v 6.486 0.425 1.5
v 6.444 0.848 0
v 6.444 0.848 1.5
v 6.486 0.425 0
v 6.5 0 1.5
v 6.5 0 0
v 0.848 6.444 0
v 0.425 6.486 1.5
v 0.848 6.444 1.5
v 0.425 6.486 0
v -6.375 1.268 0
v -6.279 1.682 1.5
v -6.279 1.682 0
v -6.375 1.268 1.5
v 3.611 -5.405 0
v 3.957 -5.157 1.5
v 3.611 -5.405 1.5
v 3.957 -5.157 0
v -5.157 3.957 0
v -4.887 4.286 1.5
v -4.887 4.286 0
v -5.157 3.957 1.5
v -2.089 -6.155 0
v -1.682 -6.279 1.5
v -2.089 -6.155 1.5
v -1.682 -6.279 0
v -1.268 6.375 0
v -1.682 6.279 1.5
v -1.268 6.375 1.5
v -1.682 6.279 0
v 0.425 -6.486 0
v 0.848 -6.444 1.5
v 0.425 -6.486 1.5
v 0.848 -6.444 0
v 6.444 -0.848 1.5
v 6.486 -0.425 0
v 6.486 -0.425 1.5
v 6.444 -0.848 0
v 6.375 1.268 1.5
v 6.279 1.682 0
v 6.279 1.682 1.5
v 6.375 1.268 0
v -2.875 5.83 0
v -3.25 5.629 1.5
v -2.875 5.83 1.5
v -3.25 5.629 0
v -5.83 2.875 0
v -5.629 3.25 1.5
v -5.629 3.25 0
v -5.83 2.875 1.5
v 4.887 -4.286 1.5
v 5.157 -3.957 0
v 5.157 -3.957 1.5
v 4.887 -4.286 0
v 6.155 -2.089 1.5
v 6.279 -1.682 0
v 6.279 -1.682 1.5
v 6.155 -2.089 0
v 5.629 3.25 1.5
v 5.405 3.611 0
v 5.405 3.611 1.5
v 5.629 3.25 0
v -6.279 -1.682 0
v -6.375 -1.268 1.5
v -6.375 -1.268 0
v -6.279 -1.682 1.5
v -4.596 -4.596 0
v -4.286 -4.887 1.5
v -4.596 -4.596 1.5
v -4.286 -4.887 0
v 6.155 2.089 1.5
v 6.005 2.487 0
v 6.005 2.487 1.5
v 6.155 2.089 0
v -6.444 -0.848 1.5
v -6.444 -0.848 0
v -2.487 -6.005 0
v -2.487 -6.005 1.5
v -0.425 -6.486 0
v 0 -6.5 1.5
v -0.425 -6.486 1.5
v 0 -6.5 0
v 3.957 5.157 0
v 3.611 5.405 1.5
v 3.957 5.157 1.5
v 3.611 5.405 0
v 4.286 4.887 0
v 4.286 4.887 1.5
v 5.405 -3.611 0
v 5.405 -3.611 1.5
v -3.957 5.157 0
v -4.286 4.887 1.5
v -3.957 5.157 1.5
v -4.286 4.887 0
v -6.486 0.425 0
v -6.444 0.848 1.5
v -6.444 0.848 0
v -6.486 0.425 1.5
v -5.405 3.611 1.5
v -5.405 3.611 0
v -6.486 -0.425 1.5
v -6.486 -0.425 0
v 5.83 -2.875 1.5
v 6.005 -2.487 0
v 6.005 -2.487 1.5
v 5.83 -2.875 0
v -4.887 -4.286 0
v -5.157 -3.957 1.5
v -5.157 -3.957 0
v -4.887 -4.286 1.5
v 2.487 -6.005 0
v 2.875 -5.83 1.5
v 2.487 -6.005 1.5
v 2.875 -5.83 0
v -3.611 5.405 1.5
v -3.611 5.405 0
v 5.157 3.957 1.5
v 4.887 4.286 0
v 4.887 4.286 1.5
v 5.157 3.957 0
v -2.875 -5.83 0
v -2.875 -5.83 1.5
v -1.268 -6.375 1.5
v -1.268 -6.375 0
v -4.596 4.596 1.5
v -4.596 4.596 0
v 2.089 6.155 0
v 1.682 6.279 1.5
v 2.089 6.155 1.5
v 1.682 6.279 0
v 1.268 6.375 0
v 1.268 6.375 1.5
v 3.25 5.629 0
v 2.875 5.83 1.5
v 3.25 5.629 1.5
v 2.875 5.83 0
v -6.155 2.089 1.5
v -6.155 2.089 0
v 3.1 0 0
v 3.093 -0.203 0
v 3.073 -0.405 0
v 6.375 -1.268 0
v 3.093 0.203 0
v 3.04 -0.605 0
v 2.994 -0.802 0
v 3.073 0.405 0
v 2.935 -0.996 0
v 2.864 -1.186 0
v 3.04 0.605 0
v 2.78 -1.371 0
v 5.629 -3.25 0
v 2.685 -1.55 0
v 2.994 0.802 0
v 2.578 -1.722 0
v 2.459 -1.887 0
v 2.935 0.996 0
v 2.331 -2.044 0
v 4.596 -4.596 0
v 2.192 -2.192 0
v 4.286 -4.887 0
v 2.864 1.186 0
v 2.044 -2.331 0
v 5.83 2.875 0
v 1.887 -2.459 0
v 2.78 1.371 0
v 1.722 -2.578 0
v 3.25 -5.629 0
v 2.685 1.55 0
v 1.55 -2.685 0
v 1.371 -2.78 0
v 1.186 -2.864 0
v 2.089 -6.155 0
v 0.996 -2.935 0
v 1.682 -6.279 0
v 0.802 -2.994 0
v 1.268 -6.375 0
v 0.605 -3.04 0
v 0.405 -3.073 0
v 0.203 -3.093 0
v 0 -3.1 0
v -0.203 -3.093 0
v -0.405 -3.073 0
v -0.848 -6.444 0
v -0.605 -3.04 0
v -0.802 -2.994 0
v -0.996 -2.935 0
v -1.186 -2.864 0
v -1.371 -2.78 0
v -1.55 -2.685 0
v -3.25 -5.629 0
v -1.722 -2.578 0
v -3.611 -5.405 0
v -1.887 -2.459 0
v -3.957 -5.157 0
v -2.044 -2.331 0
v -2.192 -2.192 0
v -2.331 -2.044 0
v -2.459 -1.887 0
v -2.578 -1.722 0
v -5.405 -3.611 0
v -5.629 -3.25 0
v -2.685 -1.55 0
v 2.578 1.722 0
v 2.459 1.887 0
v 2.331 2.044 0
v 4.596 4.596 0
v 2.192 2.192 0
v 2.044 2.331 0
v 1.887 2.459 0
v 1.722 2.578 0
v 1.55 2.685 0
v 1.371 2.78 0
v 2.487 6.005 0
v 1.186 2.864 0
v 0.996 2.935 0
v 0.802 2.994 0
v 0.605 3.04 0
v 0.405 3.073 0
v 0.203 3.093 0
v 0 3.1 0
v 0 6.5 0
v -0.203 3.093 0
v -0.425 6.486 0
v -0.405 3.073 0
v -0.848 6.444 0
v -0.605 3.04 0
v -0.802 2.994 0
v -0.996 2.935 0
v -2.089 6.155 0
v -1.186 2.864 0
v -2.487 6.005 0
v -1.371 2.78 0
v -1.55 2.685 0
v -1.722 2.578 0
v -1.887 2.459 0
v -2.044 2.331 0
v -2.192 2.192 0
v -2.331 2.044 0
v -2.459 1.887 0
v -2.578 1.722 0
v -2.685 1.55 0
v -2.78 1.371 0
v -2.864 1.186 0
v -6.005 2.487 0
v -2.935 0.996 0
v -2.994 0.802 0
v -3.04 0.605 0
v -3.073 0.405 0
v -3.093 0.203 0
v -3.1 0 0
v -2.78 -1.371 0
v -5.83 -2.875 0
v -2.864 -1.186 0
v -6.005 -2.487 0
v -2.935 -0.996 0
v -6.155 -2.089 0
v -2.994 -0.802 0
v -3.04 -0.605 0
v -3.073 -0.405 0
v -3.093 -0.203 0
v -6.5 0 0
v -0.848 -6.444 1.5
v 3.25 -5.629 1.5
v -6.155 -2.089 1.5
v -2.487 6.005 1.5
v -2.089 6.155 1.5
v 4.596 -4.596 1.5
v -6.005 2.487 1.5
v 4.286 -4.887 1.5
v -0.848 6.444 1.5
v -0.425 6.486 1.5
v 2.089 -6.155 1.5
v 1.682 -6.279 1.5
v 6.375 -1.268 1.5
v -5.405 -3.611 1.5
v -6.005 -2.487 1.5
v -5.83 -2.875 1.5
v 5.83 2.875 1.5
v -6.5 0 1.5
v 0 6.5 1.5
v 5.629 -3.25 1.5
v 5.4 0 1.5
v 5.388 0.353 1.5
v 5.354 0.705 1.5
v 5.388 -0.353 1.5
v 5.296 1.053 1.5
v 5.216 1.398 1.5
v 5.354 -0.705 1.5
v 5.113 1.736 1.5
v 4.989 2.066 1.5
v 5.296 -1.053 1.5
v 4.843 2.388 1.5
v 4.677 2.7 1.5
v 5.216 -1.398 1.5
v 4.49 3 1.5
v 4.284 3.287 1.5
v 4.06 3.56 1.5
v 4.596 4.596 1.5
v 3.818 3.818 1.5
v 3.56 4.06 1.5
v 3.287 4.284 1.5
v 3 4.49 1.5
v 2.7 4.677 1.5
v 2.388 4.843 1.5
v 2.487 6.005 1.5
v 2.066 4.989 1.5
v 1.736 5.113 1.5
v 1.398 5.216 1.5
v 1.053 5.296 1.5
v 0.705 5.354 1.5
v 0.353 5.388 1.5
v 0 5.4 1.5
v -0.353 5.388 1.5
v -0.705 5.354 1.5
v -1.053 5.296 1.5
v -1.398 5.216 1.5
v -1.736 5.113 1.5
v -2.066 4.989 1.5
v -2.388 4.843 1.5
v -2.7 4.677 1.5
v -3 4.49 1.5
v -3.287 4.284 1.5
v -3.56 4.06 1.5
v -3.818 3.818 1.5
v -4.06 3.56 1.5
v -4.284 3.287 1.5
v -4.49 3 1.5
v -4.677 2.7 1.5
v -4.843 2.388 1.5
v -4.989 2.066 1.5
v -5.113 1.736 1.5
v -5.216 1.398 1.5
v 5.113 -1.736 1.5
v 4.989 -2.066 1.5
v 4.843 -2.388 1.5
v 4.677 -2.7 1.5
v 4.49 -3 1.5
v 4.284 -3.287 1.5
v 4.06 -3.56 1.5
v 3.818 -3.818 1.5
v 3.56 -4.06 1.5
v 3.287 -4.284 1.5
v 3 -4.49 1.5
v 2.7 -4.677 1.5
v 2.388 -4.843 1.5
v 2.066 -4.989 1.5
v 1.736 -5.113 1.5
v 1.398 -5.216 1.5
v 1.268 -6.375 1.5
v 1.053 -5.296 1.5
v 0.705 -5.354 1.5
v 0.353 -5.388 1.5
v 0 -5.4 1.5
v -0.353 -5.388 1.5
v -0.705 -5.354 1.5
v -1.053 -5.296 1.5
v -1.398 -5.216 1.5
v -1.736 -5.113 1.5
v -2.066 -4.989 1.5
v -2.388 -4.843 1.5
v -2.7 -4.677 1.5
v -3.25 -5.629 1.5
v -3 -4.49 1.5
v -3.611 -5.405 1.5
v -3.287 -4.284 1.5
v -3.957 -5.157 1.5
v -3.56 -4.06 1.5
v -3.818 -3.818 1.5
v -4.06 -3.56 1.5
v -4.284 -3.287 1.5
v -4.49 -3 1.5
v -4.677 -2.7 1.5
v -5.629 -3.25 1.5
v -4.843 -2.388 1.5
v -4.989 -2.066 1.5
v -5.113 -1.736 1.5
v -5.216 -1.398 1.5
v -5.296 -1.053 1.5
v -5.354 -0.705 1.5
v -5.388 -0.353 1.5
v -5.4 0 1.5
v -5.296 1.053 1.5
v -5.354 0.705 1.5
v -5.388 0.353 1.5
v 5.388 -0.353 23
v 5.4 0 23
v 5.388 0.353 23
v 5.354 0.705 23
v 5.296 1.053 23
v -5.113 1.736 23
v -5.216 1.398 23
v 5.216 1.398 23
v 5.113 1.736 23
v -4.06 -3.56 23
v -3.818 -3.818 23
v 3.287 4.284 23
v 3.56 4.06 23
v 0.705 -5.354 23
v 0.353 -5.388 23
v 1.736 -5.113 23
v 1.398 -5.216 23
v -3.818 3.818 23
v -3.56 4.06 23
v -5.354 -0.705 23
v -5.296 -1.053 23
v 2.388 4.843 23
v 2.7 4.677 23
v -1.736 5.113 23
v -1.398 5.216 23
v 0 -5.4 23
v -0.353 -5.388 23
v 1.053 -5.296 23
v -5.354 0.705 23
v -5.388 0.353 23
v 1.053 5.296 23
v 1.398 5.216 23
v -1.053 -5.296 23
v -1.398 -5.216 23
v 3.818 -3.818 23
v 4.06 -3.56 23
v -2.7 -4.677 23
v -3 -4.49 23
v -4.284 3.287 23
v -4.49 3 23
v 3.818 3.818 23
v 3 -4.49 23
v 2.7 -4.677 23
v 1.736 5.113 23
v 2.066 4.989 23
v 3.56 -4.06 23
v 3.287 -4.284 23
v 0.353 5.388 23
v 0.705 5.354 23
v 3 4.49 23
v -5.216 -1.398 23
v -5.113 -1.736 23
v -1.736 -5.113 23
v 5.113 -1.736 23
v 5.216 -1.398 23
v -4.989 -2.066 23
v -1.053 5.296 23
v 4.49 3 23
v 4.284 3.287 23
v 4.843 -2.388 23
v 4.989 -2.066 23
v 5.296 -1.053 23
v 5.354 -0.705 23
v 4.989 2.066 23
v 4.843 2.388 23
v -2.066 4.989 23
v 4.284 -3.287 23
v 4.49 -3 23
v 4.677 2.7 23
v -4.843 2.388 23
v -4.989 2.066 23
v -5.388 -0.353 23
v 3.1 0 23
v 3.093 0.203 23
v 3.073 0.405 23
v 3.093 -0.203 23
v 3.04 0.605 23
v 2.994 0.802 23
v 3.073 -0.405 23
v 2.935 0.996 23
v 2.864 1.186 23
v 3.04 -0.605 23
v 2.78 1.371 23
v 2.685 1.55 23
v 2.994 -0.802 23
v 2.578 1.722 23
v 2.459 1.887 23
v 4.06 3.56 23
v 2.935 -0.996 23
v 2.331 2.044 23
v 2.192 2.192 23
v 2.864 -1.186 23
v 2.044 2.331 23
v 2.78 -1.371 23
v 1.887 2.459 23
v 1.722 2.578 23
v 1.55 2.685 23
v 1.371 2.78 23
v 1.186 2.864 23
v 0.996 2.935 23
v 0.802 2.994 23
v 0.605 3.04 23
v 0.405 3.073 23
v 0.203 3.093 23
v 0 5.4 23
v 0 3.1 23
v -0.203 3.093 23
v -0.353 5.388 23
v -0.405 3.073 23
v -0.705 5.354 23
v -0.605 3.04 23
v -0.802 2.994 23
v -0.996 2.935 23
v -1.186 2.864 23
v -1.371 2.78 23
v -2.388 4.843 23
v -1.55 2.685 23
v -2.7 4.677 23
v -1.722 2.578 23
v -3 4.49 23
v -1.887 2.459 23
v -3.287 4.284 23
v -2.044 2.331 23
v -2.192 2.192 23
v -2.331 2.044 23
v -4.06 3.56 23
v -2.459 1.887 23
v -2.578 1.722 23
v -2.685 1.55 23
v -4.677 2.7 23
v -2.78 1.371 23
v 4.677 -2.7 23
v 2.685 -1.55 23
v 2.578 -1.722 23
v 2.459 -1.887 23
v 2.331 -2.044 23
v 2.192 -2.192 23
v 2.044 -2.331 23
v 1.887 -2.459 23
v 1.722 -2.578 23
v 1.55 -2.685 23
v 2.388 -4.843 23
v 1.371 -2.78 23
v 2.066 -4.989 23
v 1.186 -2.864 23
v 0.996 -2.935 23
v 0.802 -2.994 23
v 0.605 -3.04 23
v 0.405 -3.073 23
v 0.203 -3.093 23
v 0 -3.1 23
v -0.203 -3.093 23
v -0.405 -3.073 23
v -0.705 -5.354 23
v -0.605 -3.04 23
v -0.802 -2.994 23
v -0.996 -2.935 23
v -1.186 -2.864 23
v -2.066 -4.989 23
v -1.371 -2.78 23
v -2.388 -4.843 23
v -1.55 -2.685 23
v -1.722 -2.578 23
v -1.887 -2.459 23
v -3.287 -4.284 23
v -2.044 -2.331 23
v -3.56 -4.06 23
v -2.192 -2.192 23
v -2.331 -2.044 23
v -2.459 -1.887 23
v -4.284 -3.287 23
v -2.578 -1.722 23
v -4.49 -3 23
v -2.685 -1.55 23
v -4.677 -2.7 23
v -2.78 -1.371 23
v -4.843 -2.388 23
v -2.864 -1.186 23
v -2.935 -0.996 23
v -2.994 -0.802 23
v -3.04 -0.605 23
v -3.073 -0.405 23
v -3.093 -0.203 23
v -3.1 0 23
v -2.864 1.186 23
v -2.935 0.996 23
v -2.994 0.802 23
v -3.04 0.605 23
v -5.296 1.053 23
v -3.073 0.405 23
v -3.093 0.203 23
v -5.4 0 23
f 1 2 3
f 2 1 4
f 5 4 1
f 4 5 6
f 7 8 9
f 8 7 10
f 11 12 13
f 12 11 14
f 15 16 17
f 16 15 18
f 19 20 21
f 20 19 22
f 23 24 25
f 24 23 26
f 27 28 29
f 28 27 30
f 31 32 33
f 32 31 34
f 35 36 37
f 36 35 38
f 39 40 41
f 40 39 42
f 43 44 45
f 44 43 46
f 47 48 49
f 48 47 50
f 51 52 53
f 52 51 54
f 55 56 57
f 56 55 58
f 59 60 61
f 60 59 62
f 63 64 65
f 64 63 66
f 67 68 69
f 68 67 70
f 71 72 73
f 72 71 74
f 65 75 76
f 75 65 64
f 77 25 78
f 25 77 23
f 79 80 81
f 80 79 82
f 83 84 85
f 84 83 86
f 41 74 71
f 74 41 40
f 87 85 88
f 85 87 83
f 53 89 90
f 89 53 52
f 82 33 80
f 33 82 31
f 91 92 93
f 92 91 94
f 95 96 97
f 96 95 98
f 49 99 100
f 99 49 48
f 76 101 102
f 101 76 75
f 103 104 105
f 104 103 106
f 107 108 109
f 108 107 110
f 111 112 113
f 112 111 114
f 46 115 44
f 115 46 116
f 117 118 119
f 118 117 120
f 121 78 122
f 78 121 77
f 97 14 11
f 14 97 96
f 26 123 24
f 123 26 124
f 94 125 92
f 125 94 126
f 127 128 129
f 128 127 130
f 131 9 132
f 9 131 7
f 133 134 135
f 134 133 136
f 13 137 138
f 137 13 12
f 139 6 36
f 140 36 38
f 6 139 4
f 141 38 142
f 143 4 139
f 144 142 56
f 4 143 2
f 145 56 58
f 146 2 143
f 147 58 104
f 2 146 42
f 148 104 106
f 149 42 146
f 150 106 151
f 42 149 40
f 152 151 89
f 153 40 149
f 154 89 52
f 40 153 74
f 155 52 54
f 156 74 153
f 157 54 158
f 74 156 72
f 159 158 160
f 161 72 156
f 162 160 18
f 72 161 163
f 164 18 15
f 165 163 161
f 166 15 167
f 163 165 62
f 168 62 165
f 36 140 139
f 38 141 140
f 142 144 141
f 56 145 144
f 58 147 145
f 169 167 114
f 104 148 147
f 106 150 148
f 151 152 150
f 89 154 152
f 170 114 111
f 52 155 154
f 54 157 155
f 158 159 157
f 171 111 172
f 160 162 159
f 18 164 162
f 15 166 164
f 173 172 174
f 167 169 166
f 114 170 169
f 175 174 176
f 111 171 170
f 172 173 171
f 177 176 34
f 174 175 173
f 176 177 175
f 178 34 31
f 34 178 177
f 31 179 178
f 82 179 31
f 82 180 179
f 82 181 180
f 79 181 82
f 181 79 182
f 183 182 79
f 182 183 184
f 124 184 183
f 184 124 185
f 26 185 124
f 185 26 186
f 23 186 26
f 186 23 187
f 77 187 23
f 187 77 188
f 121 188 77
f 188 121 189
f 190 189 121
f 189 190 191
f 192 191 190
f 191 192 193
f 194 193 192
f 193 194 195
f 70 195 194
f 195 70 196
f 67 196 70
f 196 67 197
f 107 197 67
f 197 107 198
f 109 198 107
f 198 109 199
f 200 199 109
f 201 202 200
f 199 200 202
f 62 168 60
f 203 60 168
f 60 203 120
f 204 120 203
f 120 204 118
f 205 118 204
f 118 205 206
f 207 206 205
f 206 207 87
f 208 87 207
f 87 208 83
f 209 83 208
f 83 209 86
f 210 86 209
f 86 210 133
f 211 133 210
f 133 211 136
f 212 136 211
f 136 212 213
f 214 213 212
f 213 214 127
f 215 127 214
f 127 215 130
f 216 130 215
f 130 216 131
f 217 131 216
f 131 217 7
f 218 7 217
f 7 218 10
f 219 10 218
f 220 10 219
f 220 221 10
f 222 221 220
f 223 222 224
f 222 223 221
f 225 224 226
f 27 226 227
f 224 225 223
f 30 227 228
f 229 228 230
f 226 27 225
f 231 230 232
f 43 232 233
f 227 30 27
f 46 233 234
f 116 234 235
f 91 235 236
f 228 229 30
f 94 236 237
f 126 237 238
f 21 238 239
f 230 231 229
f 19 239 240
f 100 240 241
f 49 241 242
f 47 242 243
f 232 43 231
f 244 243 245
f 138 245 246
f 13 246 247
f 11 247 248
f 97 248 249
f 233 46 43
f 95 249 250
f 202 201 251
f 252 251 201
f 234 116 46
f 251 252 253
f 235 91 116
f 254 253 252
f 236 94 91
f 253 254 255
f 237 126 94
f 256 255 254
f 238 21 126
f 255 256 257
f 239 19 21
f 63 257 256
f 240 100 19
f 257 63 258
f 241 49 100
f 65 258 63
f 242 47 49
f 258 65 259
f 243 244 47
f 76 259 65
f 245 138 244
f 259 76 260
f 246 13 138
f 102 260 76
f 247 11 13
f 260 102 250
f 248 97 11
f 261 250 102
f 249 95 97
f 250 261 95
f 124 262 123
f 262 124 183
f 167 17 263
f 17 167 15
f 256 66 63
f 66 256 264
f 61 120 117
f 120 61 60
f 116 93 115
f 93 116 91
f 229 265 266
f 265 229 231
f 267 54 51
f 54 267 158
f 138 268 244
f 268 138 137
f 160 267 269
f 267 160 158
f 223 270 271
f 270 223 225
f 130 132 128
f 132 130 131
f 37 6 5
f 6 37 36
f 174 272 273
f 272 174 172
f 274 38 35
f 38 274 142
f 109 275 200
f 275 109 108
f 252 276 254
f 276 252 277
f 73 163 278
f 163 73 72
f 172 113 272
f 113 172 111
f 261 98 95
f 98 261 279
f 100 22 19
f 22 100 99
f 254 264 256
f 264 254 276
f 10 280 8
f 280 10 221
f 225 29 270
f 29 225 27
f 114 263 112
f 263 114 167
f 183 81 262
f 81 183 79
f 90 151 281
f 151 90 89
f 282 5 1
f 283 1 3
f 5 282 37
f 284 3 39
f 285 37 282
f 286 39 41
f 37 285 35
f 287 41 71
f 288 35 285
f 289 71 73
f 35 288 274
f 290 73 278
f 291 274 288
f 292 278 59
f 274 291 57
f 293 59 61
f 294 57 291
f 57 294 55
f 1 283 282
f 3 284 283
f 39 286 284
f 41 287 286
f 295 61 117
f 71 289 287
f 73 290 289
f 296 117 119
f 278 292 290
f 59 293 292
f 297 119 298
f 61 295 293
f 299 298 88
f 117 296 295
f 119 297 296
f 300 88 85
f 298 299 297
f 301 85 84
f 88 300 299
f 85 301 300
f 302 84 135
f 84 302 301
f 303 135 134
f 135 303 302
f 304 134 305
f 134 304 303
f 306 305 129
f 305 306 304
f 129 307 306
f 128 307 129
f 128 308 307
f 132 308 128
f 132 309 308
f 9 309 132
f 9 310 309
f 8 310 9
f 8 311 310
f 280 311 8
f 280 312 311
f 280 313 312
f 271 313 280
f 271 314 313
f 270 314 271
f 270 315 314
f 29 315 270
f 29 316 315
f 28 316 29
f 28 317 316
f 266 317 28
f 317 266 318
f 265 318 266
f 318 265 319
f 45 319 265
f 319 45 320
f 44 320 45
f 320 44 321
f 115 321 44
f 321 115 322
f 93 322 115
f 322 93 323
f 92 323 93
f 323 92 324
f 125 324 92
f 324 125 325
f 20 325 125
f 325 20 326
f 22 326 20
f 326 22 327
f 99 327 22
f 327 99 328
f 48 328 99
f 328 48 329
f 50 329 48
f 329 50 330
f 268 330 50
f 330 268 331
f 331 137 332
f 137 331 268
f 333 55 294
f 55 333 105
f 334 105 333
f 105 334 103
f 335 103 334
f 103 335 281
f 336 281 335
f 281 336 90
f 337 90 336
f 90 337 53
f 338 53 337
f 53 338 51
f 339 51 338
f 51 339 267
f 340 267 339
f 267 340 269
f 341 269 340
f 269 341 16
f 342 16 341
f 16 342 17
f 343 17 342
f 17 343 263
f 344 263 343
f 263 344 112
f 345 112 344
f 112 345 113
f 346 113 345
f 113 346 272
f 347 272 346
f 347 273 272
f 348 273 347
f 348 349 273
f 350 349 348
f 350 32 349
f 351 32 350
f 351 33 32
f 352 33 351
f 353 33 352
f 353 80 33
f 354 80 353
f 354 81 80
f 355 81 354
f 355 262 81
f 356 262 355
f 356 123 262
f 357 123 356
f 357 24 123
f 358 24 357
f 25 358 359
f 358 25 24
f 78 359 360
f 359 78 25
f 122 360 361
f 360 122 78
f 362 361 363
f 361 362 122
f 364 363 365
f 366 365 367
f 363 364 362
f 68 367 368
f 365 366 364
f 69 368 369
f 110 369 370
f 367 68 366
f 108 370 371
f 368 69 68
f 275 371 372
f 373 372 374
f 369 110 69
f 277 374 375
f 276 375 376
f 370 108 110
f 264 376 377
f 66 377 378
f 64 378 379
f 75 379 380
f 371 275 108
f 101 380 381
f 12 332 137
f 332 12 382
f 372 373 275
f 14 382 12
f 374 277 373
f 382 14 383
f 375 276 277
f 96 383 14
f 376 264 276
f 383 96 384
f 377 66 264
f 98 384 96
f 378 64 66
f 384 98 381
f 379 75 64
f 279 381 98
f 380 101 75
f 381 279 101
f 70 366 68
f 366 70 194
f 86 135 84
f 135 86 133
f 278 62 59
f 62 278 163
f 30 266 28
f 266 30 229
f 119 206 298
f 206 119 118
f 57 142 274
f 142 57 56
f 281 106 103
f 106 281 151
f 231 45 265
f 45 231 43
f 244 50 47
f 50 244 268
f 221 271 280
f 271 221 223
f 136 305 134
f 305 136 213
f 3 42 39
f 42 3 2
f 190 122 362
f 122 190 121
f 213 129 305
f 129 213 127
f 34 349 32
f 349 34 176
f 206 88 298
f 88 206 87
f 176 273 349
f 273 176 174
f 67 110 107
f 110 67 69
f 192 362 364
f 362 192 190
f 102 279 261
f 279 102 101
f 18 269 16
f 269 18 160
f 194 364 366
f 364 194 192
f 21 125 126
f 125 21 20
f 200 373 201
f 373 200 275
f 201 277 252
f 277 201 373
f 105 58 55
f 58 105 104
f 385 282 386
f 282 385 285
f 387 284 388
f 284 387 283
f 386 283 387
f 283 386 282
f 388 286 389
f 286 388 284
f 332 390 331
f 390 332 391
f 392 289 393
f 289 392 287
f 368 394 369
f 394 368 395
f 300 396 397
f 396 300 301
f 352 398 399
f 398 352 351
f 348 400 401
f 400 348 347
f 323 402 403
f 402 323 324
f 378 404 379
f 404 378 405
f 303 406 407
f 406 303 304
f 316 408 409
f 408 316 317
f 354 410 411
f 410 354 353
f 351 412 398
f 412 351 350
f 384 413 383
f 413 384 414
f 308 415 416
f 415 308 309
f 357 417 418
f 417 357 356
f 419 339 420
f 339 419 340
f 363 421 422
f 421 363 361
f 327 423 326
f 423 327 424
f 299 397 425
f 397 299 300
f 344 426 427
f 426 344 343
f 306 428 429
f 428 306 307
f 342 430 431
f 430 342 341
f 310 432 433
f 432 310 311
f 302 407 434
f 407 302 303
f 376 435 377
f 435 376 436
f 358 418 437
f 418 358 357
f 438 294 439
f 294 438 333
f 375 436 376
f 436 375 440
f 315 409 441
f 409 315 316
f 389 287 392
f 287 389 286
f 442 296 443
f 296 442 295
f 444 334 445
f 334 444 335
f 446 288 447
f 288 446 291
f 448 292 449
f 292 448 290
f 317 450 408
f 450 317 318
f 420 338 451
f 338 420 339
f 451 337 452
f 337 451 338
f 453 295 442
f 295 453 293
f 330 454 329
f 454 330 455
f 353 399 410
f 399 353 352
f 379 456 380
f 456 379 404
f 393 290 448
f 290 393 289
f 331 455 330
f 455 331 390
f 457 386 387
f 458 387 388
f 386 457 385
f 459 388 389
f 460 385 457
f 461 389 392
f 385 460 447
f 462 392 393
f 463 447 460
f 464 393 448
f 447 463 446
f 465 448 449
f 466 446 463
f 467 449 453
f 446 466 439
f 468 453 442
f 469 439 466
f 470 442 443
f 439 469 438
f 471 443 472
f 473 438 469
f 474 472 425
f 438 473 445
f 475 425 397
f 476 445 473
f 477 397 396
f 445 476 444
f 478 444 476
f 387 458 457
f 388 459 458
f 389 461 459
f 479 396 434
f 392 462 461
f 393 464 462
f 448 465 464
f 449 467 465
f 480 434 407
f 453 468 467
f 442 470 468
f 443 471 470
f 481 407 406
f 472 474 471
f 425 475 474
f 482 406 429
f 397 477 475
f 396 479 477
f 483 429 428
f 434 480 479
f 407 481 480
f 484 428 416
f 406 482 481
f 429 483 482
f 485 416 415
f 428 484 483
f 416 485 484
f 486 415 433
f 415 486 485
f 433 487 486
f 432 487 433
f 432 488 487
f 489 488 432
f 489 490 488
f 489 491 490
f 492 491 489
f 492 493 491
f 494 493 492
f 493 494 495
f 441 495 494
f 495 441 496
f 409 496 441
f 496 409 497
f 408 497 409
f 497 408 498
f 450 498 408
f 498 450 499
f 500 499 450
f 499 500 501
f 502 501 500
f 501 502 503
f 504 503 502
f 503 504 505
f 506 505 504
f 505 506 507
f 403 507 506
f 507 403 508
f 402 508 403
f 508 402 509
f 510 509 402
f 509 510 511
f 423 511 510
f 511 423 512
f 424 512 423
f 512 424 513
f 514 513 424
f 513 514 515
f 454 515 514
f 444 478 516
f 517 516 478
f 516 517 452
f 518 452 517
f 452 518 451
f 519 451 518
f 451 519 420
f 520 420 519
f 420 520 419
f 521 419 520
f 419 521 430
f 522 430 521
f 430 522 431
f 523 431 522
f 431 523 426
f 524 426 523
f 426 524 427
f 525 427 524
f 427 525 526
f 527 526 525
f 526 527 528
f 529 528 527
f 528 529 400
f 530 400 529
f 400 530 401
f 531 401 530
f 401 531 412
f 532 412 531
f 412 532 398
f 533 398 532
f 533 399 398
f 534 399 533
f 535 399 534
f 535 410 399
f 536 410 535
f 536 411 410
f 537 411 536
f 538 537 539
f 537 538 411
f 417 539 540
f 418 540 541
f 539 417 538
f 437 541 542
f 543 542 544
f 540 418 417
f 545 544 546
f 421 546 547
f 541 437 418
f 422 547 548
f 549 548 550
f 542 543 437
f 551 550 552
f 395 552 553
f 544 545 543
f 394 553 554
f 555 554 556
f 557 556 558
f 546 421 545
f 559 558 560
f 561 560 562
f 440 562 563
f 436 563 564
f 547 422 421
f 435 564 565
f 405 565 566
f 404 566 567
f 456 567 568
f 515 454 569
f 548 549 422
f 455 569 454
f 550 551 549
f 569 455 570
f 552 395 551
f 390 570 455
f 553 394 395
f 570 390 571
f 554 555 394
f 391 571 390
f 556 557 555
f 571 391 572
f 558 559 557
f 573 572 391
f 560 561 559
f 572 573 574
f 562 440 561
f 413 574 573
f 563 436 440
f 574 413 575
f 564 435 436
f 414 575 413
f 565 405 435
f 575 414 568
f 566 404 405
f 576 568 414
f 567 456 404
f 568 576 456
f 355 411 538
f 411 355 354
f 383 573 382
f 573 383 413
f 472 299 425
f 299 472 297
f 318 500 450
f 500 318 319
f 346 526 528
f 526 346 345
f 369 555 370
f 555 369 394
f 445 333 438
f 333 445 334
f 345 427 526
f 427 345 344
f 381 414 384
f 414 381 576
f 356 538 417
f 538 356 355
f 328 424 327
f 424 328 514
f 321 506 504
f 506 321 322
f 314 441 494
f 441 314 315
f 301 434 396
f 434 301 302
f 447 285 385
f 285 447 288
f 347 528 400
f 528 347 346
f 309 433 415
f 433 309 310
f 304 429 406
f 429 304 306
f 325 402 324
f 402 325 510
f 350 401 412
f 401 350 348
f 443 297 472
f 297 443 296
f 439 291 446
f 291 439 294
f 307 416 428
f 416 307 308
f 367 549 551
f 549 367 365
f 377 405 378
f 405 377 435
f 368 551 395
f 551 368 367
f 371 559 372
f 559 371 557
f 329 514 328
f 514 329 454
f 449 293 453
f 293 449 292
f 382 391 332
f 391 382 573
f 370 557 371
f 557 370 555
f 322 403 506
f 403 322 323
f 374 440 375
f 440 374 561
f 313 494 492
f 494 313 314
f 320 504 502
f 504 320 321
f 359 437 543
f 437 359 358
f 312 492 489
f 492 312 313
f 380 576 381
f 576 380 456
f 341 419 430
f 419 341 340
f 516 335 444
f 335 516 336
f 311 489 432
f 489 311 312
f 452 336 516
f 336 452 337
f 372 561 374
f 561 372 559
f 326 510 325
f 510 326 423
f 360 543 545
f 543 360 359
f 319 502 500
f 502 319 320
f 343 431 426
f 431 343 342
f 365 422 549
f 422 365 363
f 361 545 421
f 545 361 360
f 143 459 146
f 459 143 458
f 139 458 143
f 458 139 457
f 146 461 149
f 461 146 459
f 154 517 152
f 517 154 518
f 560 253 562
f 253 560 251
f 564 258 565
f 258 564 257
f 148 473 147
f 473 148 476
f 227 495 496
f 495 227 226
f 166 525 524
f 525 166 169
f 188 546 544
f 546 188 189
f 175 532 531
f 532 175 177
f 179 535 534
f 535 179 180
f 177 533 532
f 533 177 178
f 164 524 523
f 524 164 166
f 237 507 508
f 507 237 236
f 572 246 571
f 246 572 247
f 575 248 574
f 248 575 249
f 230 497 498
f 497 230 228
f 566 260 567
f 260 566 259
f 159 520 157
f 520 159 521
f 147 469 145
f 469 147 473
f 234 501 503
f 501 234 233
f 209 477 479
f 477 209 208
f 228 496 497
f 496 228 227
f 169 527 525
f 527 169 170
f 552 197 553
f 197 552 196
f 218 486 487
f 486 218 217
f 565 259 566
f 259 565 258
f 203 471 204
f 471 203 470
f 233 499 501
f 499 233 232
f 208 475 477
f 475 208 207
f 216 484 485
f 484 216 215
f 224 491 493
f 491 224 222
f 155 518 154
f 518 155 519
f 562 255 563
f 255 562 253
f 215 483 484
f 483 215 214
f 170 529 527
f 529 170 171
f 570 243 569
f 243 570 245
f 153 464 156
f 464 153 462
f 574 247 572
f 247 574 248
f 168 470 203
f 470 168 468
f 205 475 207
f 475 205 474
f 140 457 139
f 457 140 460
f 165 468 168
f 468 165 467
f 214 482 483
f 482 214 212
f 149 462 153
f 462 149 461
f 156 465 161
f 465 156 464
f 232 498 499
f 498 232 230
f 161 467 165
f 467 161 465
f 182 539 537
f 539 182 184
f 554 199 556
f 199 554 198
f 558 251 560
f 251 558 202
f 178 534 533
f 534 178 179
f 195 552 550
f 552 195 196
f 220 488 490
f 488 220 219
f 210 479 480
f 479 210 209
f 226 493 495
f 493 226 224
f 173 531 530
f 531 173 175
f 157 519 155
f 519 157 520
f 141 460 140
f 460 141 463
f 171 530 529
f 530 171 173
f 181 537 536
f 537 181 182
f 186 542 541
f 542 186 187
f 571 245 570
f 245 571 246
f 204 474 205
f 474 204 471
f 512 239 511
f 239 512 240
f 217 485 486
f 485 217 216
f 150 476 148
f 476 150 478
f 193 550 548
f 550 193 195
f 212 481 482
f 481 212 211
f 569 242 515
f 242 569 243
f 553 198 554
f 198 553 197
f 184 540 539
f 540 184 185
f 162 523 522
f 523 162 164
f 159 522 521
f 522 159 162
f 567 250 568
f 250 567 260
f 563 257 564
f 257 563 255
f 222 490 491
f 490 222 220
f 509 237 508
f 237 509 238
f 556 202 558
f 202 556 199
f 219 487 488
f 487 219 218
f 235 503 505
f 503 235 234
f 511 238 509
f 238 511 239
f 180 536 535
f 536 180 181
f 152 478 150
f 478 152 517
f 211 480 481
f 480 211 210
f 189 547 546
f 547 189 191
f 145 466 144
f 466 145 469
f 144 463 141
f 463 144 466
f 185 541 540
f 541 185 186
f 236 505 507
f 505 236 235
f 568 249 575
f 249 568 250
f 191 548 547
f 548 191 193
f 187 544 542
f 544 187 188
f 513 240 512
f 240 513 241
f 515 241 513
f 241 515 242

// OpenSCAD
// PCR tube adapter sleeve: fits in a 1.5 mL rack hole, cradles a 0.2 mL tube
// Print orientation: collar on the bed (z = 0 to 1.5), sleeve body rises to z = 21.5

$fn = 96;

// ---- Dimensions (mm) ----
collar_d      = 13;    // collar outer diameter
collar_h      = 1.5;   // collar thickness (z = 0 to 1.5)
sleeve_od     = 10.8;  // sleeve body outer diameter
sleeve_top_z  = 21.5;  // top of sleeve body (absolute Z)
bore_d        = 6.2;   // through-bore diameter
eps           = 0.5;   // cutter overshoot past faces

total_h = sleeve_top_z + collar_h;  // overall height (23.0 mm)

difference() {
    union() {
        // Collar
        cylinder(d = collar_d, h = collar_h);
        // Sleeve body (overlaps slightly into collar for a clean union)
        translate([0, 0, collar_h - 0.01])
            cylinder(d = sleeve_od, h = total_h - collar_h + 0.01);
    }
    // Through-bore
    translate([0, 0, -eps])
        cylinder(d = bore_d, h = total_h + 2 * eps);
}
